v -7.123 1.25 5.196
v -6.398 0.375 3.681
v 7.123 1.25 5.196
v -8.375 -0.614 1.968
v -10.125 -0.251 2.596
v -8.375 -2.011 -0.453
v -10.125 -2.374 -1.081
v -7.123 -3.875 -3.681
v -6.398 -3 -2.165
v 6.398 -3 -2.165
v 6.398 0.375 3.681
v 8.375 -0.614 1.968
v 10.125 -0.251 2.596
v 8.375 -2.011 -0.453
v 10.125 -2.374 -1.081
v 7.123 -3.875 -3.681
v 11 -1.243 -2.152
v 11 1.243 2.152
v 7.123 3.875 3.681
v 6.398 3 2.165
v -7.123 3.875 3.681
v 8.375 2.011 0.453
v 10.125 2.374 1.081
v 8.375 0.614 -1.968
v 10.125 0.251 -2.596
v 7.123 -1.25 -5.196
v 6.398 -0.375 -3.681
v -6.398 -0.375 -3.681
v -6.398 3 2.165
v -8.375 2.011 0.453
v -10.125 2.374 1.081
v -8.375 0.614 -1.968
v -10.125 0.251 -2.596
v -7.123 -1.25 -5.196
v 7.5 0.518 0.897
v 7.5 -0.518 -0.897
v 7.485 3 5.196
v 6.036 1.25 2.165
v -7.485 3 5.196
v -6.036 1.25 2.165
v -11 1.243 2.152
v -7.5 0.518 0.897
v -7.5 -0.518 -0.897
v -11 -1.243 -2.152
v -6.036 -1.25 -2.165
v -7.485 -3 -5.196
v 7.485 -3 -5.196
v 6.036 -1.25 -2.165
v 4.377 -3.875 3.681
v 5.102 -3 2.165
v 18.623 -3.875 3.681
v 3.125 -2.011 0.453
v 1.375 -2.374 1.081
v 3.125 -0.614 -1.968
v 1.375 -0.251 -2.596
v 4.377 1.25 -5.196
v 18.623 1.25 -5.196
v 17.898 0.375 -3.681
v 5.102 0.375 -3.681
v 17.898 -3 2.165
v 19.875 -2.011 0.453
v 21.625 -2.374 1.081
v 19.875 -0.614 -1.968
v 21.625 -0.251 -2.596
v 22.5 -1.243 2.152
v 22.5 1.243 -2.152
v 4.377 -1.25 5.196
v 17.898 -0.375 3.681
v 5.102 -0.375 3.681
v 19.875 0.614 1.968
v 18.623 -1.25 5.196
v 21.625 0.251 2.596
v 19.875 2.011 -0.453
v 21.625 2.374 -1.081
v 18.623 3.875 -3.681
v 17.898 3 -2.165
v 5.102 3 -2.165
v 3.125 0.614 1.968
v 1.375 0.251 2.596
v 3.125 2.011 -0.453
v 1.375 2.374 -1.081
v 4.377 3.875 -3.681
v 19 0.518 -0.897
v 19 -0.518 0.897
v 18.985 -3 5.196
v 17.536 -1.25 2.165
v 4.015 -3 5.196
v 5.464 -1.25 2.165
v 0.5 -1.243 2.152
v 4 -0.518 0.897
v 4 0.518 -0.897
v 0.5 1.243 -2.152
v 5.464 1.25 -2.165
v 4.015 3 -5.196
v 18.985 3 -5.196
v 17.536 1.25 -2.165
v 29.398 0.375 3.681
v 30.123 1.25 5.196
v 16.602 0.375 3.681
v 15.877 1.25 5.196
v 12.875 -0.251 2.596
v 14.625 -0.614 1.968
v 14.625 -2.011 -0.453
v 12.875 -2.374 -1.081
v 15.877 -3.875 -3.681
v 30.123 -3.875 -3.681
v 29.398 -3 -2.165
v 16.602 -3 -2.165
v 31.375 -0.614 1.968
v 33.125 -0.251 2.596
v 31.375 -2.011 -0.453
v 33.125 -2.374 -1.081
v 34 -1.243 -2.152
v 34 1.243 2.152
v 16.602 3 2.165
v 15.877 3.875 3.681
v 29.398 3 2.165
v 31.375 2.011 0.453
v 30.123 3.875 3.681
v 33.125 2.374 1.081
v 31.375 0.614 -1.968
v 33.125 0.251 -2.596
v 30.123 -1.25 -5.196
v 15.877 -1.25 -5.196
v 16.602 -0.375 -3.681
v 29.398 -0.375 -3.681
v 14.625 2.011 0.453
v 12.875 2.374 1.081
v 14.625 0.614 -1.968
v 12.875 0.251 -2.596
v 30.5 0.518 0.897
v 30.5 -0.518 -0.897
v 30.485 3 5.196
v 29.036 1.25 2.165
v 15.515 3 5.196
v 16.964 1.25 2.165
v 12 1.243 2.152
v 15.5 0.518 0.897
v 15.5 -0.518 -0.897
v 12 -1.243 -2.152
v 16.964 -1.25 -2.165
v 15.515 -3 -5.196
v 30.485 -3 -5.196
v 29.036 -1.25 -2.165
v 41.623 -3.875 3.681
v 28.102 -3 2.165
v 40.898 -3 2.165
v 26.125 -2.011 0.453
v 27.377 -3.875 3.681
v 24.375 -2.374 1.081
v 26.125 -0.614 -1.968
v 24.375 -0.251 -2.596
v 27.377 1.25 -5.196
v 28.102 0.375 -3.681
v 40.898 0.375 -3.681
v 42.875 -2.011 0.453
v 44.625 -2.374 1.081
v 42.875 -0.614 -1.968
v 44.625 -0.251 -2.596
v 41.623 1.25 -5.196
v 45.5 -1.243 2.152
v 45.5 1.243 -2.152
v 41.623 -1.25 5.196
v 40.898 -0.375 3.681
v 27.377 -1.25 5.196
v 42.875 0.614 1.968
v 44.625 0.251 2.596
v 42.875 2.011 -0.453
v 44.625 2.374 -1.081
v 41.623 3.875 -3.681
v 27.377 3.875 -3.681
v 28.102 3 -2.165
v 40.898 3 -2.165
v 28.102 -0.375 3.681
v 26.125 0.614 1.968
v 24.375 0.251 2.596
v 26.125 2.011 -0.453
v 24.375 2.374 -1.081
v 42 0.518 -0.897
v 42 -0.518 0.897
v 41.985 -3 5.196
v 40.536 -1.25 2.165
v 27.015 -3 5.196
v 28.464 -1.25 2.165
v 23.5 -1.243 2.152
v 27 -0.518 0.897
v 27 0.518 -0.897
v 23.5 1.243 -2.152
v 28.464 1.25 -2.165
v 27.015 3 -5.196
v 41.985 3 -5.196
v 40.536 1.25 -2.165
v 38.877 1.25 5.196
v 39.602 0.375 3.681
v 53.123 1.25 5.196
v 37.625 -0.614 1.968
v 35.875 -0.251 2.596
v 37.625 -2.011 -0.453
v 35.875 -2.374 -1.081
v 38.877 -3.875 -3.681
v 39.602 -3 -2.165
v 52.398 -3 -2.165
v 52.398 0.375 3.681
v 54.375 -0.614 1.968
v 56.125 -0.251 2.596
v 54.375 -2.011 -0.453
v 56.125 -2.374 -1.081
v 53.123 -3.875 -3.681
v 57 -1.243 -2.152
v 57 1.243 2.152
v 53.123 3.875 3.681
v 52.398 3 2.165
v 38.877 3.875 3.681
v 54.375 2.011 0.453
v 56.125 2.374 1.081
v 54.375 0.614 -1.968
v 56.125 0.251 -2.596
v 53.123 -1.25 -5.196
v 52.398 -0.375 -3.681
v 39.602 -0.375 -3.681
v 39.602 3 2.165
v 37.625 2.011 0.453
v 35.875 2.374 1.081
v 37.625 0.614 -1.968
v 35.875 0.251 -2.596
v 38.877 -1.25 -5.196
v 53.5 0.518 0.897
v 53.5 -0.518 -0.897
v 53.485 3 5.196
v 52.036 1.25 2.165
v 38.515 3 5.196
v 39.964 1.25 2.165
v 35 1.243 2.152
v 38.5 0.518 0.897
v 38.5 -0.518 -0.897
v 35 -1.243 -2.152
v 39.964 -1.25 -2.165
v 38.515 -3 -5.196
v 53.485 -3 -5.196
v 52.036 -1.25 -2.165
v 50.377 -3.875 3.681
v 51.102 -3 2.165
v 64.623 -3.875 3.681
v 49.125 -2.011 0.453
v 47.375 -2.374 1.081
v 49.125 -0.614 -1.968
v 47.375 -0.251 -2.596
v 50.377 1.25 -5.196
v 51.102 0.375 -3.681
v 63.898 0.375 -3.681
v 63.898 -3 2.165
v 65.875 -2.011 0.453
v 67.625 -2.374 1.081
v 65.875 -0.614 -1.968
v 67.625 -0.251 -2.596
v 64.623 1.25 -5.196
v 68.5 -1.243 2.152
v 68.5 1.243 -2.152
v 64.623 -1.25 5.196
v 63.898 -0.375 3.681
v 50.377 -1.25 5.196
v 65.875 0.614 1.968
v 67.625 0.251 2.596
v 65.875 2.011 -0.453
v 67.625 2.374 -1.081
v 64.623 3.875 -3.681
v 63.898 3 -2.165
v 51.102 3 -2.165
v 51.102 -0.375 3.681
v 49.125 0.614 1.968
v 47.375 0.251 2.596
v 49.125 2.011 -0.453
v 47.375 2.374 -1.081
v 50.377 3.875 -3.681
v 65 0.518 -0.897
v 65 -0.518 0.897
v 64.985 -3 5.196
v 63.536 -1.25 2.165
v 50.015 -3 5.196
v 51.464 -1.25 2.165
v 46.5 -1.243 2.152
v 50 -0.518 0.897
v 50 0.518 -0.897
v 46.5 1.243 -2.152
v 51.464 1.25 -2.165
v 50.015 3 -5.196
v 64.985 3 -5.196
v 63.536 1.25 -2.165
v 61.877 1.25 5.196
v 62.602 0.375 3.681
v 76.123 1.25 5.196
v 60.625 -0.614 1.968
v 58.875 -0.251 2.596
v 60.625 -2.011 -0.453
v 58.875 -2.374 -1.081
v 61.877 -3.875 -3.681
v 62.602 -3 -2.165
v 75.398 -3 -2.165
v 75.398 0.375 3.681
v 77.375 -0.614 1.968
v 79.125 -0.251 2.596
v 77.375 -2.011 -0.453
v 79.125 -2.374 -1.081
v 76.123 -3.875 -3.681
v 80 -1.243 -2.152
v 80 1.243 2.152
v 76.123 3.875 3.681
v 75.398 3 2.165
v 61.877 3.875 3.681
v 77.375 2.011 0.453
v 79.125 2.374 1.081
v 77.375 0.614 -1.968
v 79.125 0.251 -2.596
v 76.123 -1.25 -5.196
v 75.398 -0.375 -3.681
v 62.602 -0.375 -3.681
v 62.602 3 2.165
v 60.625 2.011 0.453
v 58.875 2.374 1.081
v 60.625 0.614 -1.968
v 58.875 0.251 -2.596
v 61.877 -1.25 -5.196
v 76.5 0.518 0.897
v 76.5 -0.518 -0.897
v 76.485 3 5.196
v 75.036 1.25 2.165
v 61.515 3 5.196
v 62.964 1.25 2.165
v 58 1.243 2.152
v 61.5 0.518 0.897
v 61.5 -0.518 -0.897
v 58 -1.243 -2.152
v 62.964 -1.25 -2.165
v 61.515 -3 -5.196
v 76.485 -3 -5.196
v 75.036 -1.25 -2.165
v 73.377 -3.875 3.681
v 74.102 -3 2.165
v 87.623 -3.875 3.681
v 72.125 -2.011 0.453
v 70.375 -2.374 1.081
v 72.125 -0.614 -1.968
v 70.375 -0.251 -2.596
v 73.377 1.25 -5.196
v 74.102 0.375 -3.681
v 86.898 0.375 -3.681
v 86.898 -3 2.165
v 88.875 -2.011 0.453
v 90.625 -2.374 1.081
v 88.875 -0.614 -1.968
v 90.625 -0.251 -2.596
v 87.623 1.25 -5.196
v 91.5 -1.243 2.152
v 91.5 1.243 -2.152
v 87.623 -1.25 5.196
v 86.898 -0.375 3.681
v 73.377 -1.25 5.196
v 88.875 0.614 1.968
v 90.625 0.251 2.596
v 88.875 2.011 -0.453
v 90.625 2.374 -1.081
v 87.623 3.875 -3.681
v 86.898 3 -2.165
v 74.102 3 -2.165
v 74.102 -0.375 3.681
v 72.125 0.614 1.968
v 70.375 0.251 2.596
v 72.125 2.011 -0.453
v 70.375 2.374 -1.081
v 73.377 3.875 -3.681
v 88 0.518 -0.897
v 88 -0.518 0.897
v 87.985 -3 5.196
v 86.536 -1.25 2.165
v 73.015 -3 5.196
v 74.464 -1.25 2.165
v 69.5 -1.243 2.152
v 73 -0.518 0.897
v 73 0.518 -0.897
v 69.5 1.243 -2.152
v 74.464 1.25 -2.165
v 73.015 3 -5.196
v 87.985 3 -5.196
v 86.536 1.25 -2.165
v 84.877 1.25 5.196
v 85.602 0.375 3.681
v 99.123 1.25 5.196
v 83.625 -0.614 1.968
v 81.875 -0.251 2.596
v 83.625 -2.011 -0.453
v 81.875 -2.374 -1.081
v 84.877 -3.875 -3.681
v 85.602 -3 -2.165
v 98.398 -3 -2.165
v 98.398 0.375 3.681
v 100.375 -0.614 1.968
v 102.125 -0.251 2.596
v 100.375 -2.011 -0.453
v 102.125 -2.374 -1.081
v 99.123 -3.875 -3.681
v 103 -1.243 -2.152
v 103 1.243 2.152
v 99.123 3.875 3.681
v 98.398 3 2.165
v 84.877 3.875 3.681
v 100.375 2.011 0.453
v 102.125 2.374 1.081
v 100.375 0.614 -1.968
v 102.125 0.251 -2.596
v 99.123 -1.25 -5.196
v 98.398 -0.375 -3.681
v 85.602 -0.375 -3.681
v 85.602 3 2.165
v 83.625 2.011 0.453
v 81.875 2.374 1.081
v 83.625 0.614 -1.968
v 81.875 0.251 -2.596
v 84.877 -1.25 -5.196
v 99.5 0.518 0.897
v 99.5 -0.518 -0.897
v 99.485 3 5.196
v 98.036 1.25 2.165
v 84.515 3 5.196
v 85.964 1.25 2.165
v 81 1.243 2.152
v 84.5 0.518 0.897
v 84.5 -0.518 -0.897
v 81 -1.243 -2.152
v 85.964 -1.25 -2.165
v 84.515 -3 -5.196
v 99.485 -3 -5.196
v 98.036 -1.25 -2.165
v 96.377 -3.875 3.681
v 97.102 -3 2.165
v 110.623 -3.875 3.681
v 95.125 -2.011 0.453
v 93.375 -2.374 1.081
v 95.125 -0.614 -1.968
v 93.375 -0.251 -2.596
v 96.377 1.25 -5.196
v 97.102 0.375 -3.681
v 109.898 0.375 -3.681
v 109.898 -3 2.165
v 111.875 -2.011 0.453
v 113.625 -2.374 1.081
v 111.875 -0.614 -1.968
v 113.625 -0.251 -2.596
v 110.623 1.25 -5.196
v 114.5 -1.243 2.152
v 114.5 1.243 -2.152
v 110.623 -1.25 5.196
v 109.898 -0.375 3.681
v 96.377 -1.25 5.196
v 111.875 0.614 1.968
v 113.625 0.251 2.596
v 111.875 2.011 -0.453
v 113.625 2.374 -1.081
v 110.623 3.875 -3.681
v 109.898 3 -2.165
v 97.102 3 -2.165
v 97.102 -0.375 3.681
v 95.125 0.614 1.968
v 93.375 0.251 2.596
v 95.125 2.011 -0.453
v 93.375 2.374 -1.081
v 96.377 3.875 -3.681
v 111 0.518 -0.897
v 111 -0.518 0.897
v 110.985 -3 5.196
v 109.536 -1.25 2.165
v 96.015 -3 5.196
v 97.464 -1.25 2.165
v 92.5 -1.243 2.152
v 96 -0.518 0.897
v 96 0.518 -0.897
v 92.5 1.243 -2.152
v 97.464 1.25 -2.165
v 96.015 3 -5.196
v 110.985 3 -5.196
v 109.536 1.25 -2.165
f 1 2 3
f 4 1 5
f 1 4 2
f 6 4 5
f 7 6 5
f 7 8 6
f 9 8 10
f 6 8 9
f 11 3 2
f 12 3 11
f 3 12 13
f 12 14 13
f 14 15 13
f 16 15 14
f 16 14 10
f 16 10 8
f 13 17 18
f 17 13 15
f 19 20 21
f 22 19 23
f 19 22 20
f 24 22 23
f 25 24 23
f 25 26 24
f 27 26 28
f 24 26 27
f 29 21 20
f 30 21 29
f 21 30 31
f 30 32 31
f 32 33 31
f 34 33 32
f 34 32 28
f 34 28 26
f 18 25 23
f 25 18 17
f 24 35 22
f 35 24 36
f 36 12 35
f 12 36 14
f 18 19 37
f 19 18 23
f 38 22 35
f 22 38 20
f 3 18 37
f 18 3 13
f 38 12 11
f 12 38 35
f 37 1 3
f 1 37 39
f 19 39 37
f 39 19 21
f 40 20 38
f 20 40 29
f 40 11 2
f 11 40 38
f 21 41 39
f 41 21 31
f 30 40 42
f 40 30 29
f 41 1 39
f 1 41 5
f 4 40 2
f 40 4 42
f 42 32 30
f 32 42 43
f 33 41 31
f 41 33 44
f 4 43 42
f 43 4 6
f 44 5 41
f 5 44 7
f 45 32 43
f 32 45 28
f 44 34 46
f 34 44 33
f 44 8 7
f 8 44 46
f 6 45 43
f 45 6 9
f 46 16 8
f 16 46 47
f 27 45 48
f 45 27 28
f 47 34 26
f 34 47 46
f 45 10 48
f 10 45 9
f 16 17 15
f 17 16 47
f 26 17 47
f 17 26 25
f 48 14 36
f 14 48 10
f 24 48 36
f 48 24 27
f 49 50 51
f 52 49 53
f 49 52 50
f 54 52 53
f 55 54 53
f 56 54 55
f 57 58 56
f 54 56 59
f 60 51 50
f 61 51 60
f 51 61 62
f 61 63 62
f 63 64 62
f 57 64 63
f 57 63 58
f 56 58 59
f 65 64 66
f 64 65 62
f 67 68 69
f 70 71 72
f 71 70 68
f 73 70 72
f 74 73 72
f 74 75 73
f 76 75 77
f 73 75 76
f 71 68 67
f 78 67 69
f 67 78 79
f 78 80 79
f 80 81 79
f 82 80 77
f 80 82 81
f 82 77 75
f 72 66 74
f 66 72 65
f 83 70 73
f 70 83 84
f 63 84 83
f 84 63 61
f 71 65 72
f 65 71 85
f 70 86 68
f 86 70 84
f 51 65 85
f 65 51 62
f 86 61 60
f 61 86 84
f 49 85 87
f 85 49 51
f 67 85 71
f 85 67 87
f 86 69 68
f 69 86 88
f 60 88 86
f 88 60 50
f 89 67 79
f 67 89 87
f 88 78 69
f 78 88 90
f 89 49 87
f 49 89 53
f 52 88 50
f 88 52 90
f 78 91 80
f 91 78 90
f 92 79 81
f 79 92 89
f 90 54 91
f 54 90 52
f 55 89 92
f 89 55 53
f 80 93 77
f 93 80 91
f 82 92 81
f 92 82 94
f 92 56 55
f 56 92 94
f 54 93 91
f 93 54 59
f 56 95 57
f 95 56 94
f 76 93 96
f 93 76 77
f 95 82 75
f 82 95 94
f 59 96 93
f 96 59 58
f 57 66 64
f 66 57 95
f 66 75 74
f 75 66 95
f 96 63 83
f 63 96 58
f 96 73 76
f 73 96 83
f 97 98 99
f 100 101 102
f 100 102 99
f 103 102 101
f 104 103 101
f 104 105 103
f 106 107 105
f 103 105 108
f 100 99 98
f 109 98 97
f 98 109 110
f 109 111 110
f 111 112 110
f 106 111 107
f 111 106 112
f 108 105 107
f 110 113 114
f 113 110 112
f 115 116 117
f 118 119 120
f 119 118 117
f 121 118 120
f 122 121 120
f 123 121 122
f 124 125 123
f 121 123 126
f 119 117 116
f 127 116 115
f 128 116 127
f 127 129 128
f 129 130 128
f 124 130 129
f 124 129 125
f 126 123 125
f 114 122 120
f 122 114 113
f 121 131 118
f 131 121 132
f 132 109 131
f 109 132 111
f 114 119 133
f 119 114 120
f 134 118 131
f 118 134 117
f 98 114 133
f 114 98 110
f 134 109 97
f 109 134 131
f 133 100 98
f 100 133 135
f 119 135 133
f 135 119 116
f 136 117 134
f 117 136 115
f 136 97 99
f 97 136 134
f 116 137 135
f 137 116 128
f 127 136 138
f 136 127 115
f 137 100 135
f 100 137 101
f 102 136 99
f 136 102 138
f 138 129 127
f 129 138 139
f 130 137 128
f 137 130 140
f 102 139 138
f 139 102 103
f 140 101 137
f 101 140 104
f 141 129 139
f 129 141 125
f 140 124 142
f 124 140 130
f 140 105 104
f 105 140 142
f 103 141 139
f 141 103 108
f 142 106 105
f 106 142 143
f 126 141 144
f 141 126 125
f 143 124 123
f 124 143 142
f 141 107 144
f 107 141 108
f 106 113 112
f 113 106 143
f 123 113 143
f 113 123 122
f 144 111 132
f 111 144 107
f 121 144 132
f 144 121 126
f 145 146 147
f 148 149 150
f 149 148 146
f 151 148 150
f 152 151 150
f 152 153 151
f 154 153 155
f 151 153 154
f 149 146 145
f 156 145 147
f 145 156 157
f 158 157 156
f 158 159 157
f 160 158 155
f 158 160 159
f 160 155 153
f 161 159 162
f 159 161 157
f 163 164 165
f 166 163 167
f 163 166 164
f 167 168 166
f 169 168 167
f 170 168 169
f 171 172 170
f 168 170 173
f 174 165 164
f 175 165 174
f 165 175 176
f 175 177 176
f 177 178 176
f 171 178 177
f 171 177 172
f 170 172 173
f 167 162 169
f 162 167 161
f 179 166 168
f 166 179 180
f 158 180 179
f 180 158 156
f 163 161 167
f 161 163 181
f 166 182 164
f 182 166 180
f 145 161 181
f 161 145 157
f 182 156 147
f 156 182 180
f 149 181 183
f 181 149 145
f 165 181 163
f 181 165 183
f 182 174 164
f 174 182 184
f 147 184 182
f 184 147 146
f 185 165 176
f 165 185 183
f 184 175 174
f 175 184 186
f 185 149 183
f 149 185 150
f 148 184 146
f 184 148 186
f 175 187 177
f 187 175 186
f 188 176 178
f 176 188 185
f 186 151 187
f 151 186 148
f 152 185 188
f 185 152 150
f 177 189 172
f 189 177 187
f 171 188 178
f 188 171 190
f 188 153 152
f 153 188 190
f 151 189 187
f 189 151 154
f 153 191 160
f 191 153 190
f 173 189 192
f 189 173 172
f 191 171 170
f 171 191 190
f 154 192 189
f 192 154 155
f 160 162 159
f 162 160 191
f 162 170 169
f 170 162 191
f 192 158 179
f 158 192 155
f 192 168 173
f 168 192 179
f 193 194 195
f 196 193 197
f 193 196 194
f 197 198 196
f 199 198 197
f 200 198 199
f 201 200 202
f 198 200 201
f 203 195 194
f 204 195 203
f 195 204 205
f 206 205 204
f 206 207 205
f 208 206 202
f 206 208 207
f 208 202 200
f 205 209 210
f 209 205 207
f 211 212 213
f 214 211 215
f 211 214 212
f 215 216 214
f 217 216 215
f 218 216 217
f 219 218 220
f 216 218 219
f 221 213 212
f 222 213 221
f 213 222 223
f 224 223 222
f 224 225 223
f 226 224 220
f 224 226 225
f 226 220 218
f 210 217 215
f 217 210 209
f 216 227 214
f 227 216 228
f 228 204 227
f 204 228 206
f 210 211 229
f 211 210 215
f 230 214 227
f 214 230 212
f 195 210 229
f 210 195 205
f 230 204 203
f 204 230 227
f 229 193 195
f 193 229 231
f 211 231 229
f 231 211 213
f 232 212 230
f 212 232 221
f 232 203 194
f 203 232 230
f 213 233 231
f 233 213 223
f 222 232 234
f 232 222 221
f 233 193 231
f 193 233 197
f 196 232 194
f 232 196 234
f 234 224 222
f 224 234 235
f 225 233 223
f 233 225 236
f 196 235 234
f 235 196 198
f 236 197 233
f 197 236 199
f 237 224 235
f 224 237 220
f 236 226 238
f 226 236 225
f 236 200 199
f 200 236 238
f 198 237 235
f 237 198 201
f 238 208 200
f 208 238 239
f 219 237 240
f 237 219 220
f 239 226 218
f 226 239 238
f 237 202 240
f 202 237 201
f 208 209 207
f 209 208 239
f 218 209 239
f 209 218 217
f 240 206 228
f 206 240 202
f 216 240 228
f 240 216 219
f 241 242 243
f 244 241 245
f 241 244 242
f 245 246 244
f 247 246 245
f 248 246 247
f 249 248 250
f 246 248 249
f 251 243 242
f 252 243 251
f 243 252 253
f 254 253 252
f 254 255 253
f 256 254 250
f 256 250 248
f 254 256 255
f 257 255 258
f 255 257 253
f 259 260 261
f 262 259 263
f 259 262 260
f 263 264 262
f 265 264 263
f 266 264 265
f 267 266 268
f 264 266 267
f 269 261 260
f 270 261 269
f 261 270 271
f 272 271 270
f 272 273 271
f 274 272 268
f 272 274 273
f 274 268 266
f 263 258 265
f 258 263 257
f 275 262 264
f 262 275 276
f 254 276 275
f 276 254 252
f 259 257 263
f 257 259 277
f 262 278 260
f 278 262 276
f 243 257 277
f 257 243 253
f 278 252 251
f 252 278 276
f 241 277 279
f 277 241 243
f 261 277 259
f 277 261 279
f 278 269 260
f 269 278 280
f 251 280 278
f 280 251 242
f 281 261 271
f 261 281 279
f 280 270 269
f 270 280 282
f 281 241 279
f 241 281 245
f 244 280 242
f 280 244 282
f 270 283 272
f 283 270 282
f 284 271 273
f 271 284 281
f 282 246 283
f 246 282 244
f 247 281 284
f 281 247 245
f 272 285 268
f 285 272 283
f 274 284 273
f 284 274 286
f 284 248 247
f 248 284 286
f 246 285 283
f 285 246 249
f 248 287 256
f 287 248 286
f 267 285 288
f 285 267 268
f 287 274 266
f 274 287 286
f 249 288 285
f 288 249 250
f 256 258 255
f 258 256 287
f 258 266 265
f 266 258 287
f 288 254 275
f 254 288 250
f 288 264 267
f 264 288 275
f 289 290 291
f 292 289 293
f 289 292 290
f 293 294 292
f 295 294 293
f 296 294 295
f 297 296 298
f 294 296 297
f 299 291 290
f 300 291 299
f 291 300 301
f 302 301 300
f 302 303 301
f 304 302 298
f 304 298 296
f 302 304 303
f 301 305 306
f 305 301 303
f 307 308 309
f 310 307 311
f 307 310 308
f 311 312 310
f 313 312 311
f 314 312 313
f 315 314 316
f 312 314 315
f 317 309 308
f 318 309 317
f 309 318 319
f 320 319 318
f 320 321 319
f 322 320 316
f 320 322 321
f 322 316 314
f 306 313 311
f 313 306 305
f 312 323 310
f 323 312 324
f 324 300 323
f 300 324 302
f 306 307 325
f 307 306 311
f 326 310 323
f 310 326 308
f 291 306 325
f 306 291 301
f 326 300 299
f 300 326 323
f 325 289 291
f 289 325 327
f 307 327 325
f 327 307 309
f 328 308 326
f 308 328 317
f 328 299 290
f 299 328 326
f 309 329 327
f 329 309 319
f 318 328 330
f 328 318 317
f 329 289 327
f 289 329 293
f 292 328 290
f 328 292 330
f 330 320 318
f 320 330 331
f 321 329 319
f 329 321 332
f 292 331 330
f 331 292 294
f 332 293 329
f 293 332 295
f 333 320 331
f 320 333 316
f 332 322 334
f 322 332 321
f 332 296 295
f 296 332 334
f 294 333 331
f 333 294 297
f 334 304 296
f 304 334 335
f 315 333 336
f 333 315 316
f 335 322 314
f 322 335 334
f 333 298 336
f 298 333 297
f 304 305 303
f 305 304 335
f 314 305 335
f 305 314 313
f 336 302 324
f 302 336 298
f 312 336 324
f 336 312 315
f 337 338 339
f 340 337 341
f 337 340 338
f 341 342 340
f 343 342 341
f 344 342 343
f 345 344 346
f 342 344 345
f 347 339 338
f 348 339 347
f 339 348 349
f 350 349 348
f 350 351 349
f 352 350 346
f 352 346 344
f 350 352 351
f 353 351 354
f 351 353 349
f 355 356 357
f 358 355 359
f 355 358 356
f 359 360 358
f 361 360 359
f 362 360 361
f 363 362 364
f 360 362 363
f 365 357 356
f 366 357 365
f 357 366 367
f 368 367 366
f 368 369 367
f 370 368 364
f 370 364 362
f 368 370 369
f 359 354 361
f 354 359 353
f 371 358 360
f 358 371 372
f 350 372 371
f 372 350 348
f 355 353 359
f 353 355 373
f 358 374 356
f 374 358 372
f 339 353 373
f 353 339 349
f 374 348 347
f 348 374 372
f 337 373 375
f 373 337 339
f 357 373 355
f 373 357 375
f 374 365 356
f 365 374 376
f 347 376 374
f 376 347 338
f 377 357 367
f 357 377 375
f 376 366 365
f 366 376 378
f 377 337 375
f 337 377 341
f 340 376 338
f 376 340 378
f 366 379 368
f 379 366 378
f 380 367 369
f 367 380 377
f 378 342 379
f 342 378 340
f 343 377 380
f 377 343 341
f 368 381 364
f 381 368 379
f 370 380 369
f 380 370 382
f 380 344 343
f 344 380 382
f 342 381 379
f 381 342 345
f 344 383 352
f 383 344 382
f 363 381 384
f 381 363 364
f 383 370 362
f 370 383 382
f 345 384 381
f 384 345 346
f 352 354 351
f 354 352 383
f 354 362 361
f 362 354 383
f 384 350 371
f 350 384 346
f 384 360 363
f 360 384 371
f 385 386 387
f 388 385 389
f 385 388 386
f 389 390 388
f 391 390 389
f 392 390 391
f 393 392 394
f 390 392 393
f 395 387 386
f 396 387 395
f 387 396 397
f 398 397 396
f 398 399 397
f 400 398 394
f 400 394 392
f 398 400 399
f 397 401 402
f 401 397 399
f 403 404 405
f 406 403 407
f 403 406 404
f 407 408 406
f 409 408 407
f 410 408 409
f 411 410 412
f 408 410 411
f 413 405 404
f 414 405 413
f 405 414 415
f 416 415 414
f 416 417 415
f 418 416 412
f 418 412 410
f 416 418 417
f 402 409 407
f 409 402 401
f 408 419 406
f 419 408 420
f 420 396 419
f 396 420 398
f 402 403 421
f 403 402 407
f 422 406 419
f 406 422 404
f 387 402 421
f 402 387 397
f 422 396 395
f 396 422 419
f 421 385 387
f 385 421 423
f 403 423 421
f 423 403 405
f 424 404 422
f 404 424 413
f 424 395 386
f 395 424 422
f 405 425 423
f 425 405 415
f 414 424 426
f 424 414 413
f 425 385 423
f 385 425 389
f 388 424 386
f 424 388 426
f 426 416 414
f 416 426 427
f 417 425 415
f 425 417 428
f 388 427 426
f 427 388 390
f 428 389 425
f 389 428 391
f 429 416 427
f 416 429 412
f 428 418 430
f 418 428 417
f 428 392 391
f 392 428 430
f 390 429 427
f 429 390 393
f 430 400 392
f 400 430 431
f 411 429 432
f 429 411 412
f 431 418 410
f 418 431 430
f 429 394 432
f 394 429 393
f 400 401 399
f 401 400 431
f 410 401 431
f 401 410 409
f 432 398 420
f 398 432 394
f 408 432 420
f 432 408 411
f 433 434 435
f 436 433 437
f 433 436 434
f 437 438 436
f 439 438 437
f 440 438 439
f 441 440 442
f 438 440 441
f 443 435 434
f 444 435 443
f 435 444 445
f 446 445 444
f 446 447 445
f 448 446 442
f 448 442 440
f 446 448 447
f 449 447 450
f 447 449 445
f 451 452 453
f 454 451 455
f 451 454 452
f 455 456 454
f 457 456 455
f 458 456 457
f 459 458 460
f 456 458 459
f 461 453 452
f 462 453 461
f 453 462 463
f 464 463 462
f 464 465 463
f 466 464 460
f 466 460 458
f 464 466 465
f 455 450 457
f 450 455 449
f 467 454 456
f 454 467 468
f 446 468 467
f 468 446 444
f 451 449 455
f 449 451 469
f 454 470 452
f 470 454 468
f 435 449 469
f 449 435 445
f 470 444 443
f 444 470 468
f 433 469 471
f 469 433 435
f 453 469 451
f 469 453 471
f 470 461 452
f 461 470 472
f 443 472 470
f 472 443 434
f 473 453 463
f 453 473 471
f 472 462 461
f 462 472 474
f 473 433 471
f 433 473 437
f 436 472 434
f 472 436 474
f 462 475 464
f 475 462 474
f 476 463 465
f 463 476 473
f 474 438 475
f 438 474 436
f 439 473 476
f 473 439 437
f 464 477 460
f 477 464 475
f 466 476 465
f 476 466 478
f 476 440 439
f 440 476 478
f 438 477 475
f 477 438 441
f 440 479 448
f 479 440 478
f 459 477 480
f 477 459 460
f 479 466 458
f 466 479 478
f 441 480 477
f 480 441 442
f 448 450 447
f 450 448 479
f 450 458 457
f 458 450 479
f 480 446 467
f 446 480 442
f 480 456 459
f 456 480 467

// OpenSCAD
/**************
Chain generator
(http://www.thingiverse.com/thing:28405)

Author: Stefan Langemark

Generates open or closed chains with configurable
dimensions. Print without support.

Open chains (two ends):
straight_chain()
spiral_chain()

Closed chains (no end):
circular_chain()

Common parameters:
l - length of link
d - width of link
t - thickness of material
links - number of links in chain
The length of the chain when stretched is links*(l-2*t)

The spiral and circular chains need a bit wider chains
than the straight chain to make room for the curvature.

***************/


/**************
 Select output here!
***************/

// Shape of chain
type = "straight"; // [straight,circular,spiral]

// Number of links. Needs to be an even number for circular type!
links = 10; 

// Length of link
l = 22;

// Width of link (increase to 15 for circular or spiral type)
d = 12;

// Diameter of cross section
t = 3.5;

// Initial radius for spiral type
r0 = 20;

// Increase of radius per turn for spiral type
pitch = 12;

if (type == "straight") straight_chain(links, l,d,t);
if (type == "circular") circular_chain(links, l,d,t);
if (type == "spiral") spiral_chain(links, l,d,t,r0,pitch);

/*
Open chain in a spiral.
Additional parameters:
r0 - initial radius (mm).
pitch - increase of radius per turn (mm/turn).
*/
module spiral_chain(links=30,l=22,d=15,t=3.5,r0=20,pitch=12)
{
	spacing=l/2+1;
	for (i=[0:links-1])
	assign(angle = inv_arch_len(spacing*i,r0,pitch),
		angle2 = inv_arch_len(spacing*(i+1),r0,pitch))
	assign(p = arch_spiral(angle,pitch),
		p2 = arch_spiral(angle2,pitch))
	{
		translate(p)
		rotate([0,0,atan2(p2[1]-p[1],p2[0]-p[0])])
		translate([spacing/2,0,0])
		rotate([60+60*(i%2),0,0])
		link(l,d,t);
	}
}

// Straight chain segment
module straight_chain(links=5, l = 22, d = 12, t = 3.5)
{
	spacing=l/2+.5;
	for (i=[0:links-1]) {
		translate([i*spacing,0,0])rotate([60+60*(i%2),0,0])link(l,d,t);
	}
}

// Closed chain in a circle
module circular_chain(links=14, l = 22, d = 15, t = 3.5)
{
	a = 360/links;
	spacing=l/2+1; // tweak this to make chains with few links
	r=spacing/2/tan(a/2);
	echo("radius",r);
	for (i=[0:links-1]) {
		rotate([0,0,i*a])translate([0,-r,0])rotate([60+60*(i%2),0,0])link(l,d,t);
	}
}

// Single chain link. Centered, with l,d,t in axes x,y,z, respectively.
module link(l,d,t)
{
	union() {
	for (a=[0:7])
	{
		assign(
			off1 = (l-d)/2*((a-.5>2&&a-.5<6)?-1:1),
			off2 = (l-d)/2*((a+.5>2&&a+.5<6)?-1:1))
		{
			intersection() {
				translate([0,0,-t/2])
				pie((a-.5)*360/8,
					(a+.5)*360/8,l,t,
					[off1,0],[off2,0]);
				translate([(off1+off2)/2,0,0])
				rotate([0,0,a*360/8])
				rotate([-90,0,0])
				translate([(d-t)/2,0,-l/2])
				cylinder($fn=6,r=t/2,h=l);
			}
		}
	}
}
}

function pol(r,a) = [r*cos(a),r*sin(a)];
module pie(a1,a2,r,h,o1,o2)
{
	if (o1==o2) {
	linear_extrude(height=h)
		polygon([o1,o1+pol(r,a1),o1+pol(r,a2)]);
	} else {
	linear_extrude(height=h)
		polygon([o1,o1+pol(r,a1),o2+pol(r,a2),o2]);
	}
}

// Approximate angle of archimedes spiral of length len (mm) from radius r0, given pitch a (mm/turn).
function inv_arch_len(len,r0,a) = 180/3.1416*sqrt(len*2/(a/2/3.1416)+(r0*2*3.1416/a)*(r0*2*3.1416/a));

// Point on archimedes spiral at angle given pitch a (mm/turn).
function arch_spiral(angle,a) = [a*angle/360*cos(angle),a*angle/360*sin(angle),0];
